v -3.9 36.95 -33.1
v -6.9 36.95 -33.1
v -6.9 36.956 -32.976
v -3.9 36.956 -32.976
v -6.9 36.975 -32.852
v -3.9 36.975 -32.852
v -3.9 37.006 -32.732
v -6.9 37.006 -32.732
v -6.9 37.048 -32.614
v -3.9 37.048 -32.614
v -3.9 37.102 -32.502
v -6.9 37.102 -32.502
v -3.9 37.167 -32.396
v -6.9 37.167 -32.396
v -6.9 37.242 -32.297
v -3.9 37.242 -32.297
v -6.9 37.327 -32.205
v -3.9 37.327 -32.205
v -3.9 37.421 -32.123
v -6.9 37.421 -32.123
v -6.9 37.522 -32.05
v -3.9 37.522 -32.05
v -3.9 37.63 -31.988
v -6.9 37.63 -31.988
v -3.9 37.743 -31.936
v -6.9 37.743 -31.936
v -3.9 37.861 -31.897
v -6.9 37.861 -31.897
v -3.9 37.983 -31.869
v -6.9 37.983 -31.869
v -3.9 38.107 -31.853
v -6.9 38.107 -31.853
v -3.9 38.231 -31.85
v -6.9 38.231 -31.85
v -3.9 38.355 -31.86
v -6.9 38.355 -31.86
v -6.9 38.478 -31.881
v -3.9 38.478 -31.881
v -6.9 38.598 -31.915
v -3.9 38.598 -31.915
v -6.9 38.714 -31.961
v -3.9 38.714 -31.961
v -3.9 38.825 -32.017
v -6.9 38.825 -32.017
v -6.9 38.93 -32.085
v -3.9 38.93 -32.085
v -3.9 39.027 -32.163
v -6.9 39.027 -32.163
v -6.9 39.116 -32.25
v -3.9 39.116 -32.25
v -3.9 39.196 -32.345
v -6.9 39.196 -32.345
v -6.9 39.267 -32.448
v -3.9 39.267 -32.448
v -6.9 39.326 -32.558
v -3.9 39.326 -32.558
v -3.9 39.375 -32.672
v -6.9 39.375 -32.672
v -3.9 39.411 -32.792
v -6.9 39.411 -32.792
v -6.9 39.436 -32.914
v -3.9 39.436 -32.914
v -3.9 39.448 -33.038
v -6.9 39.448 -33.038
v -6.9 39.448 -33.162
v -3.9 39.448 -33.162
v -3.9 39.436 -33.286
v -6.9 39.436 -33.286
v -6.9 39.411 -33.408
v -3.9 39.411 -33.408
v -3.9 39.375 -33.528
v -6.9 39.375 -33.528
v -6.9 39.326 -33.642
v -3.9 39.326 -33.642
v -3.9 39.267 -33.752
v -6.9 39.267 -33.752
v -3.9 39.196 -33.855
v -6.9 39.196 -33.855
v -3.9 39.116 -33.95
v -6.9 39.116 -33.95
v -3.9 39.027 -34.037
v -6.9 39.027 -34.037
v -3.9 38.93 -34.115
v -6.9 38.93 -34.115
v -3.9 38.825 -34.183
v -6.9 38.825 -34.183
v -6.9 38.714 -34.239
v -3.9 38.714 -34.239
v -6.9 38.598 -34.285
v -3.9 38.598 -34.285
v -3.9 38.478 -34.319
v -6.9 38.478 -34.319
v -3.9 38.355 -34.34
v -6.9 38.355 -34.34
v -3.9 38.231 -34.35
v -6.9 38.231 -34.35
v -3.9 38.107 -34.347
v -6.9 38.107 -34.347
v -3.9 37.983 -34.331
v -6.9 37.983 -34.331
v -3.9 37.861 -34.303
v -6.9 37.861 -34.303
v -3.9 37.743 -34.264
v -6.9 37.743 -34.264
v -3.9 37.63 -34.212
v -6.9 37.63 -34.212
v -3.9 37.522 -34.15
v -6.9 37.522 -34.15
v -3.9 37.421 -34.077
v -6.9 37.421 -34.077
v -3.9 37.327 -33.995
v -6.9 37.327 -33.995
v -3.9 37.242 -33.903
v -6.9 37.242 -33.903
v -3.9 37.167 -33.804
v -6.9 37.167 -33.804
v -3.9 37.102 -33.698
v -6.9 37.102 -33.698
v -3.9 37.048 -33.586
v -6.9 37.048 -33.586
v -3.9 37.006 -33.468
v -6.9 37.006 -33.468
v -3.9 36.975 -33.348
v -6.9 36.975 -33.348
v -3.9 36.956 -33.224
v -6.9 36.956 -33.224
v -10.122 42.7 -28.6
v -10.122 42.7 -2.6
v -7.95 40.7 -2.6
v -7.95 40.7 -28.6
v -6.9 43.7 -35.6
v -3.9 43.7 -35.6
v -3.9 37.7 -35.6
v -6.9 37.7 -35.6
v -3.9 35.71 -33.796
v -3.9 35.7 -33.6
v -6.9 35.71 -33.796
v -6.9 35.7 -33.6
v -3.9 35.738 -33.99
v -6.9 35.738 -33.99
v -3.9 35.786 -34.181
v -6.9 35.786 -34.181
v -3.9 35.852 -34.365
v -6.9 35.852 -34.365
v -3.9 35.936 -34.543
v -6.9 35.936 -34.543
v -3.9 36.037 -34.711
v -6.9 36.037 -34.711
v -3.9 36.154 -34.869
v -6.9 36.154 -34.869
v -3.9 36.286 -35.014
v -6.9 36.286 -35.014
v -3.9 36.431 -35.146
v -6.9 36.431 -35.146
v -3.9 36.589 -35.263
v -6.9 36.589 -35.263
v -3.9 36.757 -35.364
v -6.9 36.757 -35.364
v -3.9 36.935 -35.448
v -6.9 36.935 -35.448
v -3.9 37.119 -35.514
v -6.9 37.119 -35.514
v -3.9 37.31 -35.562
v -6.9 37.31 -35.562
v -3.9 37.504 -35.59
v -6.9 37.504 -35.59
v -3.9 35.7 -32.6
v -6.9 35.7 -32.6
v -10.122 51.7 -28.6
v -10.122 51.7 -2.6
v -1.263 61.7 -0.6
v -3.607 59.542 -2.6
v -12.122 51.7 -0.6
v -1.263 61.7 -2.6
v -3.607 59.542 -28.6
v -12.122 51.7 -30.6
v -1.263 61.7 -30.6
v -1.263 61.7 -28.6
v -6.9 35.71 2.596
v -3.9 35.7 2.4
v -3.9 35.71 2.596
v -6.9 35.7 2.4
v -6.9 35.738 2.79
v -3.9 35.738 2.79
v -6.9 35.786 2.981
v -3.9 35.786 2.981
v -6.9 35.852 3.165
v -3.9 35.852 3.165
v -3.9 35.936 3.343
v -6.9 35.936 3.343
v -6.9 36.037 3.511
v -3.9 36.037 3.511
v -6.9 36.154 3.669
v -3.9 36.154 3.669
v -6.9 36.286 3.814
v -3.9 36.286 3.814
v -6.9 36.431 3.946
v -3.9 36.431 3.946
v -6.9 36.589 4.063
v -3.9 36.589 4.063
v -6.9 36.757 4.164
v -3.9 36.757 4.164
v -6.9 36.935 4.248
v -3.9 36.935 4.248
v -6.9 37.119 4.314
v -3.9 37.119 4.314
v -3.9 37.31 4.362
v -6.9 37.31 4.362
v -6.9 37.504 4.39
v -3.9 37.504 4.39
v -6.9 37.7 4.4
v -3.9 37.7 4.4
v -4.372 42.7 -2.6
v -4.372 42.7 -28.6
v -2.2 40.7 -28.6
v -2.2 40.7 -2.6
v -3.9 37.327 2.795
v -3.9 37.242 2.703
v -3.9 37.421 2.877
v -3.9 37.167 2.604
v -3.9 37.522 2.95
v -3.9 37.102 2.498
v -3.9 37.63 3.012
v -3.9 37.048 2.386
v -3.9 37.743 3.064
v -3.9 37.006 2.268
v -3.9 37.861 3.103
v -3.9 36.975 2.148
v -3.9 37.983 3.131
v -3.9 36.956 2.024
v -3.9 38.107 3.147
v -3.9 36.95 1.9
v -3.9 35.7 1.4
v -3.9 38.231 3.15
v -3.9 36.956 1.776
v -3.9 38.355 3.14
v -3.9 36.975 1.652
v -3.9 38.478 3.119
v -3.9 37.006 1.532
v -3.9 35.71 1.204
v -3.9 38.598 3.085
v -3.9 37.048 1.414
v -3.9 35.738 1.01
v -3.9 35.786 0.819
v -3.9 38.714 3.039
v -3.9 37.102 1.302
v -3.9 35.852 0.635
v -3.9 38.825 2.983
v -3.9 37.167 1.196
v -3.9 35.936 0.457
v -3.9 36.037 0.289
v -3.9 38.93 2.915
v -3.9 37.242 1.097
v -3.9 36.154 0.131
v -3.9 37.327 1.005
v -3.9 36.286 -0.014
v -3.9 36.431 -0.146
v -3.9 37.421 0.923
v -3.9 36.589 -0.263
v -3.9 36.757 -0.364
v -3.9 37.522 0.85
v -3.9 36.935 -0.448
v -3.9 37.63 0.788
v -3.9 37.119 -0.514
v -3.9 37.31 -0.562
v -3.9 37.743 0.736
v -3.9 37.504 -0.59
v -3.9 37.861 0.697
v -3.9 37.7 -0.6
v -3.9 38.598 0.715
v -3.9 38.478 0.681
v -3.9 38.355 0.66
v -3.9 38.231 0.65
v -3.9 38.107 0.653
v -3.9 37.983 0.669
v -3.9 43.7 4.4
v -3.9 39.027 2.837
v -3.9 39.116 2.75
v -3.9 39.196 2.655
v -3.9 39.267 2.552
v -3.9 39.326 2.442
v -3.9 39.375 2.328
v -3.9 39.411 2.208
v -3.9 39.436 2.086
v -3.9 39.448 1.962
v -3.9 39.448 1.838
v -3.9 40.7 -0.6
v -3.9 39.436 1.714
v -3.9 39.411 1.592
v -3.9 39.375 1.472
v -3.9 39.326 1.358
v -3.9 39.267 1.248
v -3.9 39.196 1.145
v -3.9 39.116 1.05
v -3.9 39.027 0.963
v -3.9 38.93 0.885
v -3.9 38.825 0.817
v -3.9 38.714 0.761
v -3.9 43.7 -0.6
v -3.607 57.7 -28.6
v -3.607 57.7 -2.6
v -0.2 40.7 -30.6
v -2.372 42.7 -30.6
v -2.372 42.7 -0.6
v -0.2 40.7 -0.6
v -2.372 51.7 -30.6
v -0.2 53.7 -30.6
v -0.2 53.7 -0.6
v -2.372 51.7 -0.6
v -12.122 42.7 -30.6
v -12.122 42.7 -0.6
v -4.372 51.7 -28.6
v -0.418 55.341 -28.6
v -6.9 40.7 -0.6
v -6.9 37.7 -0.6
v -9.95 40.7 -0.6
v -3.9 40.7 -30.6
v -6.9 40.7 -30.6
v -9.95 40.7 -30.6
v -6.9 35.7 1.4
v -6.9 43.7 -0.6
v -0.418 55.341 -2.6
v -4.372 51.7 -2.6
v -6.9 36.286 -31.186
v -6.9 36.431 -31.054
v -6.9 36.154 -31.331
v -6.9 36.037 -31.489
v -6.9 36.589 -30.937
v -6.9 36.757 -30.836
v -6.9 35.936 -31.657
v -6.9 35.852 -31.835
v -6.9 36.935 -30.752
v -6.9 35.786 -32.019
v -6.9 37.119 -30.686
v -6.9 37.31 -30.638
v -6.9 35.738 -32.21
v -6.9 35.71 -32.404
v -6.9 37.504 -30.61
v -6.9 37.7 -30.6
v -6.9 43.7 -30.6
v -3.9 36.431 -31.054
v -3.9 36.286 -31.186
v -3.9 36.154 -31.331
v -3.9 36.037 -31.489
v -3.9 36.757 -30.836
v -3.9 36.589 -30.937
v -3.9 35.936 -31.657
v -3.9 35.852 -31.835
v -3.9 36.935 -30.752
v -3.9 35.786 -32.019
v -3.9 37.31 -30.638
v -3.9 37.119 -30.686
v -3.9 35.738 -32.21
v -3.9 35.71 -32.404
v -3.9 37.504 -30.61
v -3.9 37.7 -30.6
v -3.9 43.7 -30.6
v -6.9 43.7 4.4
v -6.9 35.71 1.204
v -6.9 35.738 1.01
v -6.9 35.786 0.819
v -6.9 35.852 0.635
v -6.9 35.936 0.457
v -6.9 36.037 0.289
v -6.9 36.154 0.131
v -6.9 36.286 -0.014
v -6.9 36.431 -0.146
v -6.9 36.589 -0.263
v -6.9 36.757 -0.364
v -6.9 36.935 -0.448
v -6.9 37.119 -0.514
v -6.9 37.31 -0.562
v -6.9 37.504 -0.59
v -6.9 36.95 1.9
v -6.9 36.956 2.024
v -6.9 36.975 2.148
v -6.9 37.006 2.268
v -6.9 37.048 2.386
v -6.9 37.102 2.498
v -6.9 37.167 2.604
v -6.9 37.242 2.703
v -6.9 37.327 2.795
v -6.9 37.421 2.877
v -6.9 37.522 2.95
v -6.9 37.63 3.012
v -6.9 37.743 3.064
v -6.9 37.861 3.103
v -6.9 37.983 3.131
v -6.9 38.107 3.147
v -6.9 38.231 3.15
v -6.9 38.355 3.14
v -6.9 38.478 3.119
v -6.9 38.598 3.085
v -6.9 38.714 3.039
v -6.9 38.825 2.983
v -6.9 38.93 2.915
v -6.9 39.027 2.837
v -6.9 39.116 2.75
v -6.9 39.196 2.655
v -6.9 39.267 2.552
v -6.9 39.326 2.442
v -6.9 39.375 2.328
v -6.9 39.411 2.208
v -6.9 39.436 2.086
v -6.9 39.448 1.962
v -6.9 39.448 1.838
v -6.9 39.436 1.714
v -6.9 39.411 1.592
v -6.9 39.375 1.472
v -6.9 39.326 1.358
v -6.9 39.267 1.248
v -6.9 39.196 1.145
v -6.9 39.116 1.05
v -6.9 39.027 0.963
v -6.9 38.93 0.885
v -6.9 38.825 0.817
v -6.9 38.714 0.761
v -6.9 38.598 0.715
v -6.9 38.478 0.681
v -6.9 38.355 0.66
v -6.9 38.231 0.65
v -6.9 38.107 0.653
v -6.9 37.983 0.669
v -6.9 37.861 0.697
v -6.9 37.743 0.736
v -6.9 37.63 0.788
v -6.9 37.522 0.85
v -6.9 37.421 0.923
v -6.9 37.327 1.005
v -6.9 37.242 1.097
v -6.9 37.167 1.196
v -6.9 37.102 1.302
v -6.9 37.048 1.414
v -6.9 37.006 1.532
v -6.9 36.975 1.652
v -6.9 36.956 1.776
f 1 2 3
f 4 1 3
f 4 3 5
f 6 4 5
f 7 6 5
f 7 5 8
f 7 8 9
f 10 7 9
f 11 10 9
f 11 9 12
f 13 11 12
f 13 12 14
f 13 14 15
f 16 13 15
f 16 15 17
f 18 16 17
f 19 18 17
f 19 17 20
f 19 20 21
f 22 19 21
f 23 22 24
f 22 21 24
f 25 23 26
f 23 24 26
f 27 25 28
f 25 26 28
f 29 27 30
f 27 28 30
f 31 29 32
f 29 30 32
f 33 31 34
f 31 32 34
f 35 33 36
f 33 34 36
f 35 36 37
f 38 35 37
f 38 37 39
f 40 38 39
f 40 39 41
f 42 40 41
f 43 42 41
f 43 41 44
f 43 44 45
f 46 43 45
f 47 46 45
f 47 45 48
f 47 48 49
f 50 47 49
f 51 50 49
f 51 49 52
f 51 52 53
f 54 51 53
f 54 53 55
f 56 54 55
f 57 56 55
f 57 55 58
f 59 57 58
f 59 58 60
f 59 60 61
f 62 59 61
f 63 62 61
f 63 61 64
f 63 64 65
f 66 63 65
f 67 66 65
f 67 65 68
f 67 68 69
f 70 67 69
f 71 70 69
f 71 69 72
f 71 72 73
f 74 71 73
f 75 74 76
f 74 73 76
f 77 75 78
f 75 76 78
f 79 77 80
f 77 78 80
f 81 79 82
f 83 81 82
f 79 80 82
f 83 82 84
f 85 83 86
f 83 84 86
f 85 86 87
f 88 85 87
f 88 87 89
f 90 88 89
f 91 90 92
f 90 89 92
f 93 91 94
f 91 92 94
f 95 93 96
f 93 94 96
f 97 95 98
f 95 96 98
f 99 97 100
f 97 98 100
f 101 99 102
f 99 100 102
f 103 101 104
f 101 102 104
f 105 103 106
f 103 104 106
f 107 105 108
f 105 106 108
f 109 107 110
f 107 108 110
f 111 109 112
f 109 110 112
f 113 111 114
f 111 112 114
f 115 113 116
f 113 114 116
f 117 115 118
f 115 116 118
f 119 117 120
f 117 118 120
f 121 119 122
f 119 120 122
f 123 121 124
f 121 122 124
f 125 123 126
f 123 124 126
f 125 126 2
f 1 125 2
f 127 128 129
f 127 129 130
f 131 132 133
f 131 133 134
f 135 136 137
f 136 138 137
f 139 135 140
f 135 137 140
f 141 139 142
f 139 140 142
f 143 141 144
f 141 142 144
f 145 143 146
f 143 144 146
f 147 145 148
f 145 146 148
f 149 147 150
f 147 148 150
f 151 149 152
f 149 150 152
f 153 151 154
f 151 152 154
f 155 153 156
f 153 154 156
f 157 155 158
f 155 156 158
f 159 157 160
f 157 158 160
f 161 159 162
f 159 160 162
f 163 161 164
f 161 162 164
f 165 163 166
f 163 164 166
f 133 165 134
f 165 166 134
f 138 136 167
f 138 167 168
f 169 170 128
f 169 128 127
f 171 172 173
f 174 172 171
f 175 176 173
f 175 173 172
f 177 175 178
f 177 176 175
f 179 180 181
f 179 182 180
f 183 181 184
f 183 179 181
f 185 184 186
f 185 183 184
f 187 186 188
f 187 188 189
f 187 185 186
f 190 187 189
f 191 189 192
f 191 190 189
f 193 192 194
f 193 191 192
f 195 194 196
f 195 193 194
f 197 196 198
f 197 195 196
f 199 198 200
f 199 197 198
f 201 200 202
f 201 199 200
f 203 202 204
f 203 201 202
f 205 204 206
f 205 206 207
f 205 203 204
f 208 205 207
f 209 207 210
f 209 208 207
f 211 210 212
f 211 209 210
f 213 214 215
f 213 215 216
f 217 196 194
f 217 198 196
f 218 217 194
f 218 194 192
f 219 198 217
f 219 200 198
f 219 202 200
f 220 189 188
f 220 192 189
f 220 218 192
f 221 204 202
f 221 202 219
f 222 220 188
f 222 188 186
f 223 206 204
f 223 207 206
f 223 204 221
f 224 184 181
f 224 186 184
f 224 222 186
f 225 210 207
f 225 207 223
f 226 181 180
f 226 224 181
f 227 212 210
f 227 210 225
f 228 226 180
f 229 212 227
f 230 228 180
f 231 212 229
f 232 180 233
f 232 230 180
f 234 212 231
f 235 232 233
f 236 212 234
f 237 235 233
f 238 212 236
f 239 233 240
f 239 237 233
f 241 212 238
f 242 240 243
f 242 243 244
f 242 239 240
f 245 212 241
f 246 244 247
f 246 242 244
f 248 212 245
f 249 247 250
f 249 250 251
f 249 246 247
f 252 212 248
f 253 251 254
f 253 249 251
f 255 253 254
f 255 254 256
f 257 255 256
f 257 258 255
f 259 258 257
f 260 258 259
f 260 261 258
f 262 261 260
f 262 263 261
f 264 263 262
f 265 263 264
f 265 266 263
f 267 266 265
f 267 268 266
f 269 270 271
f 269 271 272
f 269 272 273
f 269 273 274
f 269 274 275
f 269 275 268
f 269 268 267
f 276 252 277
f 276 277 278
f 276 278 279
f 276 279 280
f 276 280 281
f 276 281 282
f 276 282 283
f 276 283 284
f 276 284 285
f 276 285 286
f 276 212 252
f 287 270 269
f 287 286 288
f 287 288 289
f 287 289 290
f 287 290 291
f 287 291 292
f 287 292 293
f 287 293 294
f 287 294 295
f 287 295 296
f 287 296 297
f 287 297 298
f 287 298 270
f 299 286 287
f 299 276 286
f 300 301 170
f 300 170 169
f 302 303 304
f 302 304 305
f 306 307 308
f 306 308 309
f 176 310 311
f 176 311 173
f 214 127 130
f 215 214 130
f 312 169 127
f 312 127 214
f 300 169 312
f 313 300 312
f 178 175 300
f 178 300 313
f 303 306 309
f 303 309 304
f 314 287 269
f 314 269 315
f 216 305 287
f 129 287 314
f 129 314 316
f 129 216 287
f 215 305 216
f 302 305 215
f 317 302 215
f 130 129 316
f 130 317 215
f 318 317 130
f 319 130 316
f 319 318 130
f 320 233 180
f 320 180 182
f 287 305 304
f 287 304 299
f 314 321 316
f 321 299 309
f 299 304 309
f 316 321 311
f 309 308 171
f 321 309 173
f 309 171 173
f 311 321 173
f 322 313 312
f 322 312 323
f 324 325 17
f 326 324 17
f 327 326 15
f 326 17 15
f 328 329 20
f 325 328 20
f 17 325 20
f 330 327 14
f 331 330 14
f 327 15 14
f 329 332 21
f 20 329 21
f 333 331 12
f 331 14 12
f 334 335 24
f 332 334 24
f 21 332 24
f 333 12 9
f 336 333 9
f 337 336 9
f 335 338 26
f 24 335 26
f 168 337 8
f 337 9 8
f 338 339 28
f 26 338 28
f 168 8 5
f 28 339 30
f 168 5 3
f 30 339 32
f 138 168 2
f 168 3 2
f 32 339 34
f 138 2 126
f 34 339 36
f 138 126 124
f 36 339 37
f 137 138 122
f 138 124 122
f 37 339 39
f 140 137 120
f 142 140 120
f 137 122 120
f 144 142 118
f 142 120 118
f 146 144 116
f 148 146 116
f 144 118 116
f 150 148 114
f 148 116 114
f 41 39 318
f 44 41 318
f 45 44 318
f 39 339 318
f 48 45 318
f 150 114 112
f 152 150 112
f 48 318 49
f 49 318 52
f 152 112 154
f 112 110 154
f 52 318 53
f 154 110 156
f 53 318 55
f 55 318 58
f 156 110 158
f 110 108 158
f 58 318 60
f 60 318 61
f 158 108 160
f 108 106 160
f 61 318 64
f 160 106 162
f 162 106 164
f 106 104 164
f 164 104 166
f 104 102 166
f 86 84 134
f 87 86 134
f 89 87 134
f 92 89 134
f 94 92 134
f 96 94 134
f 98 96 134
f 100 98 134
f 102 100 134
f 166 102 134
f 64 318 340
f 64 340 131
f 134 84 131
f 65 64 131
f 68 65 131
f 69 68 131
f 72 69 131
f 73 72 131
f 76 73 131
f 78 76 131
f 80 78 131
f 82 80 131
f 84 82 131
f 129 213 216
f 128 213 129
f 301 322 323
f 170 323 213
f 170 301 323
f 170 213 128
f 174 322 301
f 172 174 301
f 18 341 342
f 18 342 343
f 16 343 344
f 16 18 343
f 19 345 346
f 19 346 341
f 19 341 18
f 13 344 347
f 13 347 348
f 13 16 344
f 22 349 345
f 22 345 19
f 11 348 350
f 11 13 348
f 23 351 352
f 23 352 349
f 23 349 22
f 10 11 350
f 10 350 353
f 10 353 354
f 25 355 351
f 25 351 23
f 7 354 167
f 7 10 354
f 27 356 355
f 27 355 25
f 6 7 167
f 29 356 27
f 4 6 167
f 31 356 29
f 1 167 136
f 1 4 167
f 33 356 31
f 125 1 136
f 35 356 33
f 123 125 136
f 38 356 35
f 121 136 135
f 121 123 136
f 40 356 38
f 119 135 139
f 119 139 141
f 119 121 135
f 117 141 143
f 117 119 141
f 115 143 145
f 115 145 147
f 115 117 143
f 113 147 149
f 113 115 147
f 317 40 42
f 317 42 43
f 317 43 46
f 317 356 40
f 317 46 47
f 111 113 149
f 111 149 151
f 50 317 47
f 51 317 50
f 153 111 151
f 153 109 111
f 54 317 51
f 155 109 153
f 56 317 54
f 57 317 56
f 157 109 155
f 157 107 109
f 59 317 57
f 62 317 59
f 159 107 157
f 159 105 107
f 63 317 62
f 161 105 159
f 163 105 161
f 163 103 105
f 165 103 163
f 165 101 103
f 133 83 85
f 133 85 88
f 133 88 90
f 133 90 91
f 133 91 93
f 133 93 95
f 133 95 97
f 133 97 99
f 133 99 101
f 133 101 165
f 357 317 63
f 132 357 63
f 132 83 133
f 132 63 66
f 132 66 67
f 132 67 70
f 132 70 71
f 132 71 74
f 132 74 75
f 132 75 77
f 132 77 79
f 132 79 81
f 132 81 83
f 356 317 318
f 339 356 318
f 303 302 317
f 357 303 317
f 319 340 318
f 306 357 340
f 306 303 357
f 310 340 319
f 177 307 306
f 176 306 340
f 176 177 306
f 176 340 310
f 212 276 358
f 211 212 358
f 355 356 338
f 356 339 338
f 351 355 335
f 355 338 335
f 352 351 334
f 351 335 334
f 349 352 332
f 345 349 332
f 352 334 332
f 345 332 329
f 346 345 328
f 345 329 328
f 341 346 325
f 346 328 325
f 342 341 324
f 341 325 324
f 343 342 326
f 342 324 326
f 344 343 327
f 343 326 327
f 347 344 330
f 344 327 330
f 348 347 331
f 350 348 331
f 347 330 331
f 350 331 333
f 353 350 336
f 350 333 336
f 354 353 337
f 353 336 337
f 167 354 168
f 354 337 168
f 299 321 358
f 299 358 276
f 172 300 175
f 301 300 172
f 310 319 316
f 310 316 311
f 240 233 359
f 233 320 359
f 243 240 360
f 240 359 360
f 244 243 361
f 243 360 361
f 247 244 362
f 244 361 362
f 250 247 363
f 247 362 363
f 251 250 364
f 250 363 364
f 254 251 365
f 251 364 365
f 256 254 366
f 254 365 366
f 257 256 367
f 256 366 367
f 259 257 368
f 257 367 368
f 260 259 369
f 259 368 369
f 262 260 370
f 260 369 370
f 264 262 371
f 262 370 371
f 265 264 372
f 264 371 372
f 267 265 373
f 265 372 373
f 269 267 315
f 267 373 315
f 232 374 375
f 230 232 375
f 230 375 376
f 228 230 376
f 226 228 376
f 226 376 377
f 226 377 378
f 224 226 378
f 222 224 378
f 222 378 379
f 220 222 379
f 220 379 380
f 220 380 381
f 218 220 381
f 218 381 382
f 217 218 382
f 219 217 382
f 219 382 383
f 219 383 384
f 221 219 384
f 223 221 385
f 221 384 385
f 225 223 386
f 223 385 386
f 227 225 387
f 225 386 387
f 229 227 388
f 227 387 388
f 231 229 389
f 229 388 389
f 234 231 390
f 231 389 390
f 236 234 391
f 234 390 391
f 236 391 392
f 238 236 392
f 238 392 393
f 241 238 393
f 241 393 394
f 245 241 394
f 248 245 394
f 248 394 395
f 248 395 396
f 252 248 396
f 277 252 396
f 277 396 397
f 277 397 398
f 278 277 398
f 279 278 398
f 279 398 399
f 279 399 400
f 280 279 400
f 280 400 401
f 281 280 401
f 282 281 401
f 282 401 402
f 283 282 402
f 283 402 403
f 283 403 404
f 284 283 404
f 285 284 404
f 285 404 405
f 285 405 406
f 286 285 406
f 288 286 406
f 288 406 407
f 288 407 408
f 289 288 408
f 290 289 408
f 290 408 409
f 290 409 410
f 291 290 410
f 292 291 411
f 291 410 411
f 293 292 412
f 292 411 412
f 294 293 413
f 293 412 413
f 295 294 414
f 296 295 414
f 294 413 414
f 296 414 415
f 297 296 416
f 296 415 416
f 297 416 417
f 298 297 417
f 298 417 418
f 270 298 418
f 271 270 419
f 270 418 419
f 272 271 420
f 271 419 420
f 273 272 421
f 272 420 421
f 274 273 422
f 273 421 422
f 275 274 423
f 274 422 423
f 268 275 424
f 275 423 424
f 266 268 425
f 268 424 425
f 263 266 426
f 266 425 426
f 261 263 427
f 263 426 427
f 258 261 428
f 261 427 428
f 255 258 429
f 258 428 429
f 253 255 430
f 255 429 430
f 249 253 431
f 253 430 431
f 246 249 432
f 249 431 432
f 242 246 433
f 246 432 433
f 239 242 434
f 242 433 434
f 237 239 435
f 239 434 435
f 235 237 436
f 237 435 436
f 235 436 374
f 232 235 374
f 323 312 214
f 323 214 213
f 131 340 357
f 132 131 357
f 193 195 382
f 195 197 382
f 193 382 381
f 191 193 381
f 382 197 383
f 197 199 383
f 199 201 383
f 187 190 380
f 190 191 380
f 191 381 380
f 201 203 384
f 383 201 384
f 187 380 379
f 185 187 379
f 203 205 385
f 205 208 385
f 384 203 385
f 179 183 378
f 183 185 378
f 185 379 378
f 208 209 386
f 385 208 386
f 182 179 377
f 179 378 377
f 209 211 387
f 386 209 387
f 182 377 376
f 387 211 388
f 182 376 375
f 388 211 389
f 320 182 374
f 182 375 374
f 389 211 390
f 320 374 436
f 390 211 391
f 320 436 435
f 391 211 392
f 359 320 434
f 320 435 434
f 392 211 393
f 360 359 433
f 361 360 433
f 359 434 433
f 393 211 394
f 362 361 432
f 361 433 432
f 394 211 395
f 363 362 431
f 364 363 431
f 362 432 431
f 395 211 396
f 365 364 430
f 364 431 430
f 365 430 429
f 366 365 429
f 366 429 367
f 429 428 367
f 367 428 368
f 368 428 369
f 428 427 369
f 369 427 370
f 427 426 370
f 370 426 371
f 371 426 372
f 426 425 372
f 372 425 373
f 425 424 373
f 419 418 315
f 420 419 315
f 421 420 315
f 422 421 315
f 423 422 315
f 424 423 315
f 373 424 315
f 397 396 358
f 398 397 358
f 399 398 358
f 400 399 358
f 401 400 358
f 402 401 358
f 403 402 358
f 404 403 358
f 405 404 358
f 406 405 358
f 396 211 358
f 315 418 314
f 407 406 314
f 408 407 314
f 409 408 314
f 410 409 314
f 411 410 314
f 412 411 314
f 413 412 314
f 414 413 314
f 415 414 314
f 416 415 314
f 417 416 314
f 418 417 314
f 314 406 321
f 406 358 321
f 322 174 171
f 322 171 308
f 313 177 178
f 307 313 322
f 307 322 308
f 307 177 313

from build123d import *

# Parameters (mm, degrees)
PAD007_DEPTH    = 30
SKETCH021_W     = 5.75
SKETCH021_H     = 26
SKETCH023_W     = 2.875
SKETCH023_H     = 26
POCKET009_DEPTH = 5
SKETCH024_W     = 3
SKETCH024_H     = 3
PAD008_DEPTH    = 5
PAD008_FACE6_W  = 3
PAD008_FACE6_H  = 5
PAD009_DEPTH    = 5
SKETCH025_W     = 3
SKETCH025_H     = 3
PAD010_DEPTH    = 5
PAD010_FACE7_W  = 3
PAD010_FACE7_H  = 5
PAD011_DEPTH    = 5
SKETCH026_R     = 1.25
POCKET010_DEPTH = 5
FILLET_R        = 2


with BuildPart() as part:
    # Sketch020 → Pad007 (new body)
    with BuildSketch(Plane.XY):
        Polygon((-9.75, -21), (-11.9217087917, -19), (-11.9217087917, -10), (-1.063164833, 0), (0, -8), (-2.1717087917, -10), (-2.1717087917, -19), (0, -21), align=None)
    extrude(amount=PAD007_DEPTH)

    # SubtractivePipe: sweep along a path in Sketch022
    with BuildLine(Plane.XY.offset(30)) as subtractivepipe_path:
        Line((-4.875, -21), (-7.0467087917, -19))
        Line((-7.0467087917, -19), (-7.0467087917, -10))
        Line((-7.0467087917, -10), (-0.5315824165, -4))
    # Sketch021 (on Face8 of Pad007) → SubtractivePipe (sweep, cut)
    with BuildSketch(Plane.XZ.offset(21)):
        with Locations((-4.875, 15)):
            Rectangle(SKETCH021_W, SKETCH021_H)
    sweep(path=subtractivepipe_path.line, mode=Mode.SUBTRACT)

    # Sketch023 (on Face22 of SubtractivePipe) → Pocket009 (cut)
    with BuildSketch(Plane.XZ.offset(4)):
        with Locations((-1.9690824165, 15)):
            Rectangle(SKETCH023_W, SKETCH023_H)
    extrude(amount=-POCKET009_DEPTH, mode=Mode.SUBTRACT)

    # Sketch024 (on Face4 of Pocket009) → Pad008 (join)
    with BuildSketch(Plane(origin=(0, 0, 0), x_dir=(1, 0, 0), z_dir=(0, 0, -1))):
        with Locations((-5.2, 19.5)):
            Rectangle(SKETCH024_W, SKETCH024_H)
    extrude(amount=PAD008_DEPTH)

    # Pad008 Face6 → Pad009 (add)
    with BuildSketch(Plane(origin=(-5.2, -21, -2.5), x_dir=(-1, 0, 0), z_dir=(0, -1, 0))):
        Rectangle(PAD008_FACE6_W, PAD008_FACE6_H)
    extrude(amount=PAD009_DEPTH)

    # Sketch025 (on Face5 of Pad009) → Pad010 (join)
    with BuildSketch(Plane.XY.offset(30)):
        with Locations((-5.2, -19.5)):
            Rectangle(SKETCH025_W, SKETCH025_H)
    extrude(amount=PAD010_DEPTH)

    # Pad010 Face7 → Pad011 (add)
    with BuildSketch(Plane(origin=(-5.2, -21, 32.5), x_dir=(-1, 0, 0), z_dir=(0, -1, 0))):
        Rectangle(PAD010_FACE7_W, PAD010_FACE7_H)
    extrude(amount=PAD011_DEPTH)

    # Sketch026 → Pocket010 (cut)
    with BuildSketch(Plane(origin=(-6.7, 0, 0), x_dir=(0, -1, 0), z_dir=(-1, 0, 0))):
        with Locations((23.5, -2.5)):
            Circle(SKETCH026_R)
        with Locations((23.5, 32.5)):
            Circle(SKETCH026_R)
    extrude(amount=-POCKET010_DEPTH, mode=Mode.SUBTRACT)

    # Fillet
    fillet_edges = [part.edges().sort_by_distance(p)[0] for p in [
        (-5.2, -26, 35),
        (-5.2, -26, 30),
        (-5.2, -26, 0),
        (-5.2, -26, -5),
    ]]
    fillet(fillet_edges, radius=FILLET_R)


with BuildPart() as part_1:
    # Body002 placement: moved
    add(part.part.moved(Location((-0.2, 61.7, -30.6))))


solid = part_1.part
